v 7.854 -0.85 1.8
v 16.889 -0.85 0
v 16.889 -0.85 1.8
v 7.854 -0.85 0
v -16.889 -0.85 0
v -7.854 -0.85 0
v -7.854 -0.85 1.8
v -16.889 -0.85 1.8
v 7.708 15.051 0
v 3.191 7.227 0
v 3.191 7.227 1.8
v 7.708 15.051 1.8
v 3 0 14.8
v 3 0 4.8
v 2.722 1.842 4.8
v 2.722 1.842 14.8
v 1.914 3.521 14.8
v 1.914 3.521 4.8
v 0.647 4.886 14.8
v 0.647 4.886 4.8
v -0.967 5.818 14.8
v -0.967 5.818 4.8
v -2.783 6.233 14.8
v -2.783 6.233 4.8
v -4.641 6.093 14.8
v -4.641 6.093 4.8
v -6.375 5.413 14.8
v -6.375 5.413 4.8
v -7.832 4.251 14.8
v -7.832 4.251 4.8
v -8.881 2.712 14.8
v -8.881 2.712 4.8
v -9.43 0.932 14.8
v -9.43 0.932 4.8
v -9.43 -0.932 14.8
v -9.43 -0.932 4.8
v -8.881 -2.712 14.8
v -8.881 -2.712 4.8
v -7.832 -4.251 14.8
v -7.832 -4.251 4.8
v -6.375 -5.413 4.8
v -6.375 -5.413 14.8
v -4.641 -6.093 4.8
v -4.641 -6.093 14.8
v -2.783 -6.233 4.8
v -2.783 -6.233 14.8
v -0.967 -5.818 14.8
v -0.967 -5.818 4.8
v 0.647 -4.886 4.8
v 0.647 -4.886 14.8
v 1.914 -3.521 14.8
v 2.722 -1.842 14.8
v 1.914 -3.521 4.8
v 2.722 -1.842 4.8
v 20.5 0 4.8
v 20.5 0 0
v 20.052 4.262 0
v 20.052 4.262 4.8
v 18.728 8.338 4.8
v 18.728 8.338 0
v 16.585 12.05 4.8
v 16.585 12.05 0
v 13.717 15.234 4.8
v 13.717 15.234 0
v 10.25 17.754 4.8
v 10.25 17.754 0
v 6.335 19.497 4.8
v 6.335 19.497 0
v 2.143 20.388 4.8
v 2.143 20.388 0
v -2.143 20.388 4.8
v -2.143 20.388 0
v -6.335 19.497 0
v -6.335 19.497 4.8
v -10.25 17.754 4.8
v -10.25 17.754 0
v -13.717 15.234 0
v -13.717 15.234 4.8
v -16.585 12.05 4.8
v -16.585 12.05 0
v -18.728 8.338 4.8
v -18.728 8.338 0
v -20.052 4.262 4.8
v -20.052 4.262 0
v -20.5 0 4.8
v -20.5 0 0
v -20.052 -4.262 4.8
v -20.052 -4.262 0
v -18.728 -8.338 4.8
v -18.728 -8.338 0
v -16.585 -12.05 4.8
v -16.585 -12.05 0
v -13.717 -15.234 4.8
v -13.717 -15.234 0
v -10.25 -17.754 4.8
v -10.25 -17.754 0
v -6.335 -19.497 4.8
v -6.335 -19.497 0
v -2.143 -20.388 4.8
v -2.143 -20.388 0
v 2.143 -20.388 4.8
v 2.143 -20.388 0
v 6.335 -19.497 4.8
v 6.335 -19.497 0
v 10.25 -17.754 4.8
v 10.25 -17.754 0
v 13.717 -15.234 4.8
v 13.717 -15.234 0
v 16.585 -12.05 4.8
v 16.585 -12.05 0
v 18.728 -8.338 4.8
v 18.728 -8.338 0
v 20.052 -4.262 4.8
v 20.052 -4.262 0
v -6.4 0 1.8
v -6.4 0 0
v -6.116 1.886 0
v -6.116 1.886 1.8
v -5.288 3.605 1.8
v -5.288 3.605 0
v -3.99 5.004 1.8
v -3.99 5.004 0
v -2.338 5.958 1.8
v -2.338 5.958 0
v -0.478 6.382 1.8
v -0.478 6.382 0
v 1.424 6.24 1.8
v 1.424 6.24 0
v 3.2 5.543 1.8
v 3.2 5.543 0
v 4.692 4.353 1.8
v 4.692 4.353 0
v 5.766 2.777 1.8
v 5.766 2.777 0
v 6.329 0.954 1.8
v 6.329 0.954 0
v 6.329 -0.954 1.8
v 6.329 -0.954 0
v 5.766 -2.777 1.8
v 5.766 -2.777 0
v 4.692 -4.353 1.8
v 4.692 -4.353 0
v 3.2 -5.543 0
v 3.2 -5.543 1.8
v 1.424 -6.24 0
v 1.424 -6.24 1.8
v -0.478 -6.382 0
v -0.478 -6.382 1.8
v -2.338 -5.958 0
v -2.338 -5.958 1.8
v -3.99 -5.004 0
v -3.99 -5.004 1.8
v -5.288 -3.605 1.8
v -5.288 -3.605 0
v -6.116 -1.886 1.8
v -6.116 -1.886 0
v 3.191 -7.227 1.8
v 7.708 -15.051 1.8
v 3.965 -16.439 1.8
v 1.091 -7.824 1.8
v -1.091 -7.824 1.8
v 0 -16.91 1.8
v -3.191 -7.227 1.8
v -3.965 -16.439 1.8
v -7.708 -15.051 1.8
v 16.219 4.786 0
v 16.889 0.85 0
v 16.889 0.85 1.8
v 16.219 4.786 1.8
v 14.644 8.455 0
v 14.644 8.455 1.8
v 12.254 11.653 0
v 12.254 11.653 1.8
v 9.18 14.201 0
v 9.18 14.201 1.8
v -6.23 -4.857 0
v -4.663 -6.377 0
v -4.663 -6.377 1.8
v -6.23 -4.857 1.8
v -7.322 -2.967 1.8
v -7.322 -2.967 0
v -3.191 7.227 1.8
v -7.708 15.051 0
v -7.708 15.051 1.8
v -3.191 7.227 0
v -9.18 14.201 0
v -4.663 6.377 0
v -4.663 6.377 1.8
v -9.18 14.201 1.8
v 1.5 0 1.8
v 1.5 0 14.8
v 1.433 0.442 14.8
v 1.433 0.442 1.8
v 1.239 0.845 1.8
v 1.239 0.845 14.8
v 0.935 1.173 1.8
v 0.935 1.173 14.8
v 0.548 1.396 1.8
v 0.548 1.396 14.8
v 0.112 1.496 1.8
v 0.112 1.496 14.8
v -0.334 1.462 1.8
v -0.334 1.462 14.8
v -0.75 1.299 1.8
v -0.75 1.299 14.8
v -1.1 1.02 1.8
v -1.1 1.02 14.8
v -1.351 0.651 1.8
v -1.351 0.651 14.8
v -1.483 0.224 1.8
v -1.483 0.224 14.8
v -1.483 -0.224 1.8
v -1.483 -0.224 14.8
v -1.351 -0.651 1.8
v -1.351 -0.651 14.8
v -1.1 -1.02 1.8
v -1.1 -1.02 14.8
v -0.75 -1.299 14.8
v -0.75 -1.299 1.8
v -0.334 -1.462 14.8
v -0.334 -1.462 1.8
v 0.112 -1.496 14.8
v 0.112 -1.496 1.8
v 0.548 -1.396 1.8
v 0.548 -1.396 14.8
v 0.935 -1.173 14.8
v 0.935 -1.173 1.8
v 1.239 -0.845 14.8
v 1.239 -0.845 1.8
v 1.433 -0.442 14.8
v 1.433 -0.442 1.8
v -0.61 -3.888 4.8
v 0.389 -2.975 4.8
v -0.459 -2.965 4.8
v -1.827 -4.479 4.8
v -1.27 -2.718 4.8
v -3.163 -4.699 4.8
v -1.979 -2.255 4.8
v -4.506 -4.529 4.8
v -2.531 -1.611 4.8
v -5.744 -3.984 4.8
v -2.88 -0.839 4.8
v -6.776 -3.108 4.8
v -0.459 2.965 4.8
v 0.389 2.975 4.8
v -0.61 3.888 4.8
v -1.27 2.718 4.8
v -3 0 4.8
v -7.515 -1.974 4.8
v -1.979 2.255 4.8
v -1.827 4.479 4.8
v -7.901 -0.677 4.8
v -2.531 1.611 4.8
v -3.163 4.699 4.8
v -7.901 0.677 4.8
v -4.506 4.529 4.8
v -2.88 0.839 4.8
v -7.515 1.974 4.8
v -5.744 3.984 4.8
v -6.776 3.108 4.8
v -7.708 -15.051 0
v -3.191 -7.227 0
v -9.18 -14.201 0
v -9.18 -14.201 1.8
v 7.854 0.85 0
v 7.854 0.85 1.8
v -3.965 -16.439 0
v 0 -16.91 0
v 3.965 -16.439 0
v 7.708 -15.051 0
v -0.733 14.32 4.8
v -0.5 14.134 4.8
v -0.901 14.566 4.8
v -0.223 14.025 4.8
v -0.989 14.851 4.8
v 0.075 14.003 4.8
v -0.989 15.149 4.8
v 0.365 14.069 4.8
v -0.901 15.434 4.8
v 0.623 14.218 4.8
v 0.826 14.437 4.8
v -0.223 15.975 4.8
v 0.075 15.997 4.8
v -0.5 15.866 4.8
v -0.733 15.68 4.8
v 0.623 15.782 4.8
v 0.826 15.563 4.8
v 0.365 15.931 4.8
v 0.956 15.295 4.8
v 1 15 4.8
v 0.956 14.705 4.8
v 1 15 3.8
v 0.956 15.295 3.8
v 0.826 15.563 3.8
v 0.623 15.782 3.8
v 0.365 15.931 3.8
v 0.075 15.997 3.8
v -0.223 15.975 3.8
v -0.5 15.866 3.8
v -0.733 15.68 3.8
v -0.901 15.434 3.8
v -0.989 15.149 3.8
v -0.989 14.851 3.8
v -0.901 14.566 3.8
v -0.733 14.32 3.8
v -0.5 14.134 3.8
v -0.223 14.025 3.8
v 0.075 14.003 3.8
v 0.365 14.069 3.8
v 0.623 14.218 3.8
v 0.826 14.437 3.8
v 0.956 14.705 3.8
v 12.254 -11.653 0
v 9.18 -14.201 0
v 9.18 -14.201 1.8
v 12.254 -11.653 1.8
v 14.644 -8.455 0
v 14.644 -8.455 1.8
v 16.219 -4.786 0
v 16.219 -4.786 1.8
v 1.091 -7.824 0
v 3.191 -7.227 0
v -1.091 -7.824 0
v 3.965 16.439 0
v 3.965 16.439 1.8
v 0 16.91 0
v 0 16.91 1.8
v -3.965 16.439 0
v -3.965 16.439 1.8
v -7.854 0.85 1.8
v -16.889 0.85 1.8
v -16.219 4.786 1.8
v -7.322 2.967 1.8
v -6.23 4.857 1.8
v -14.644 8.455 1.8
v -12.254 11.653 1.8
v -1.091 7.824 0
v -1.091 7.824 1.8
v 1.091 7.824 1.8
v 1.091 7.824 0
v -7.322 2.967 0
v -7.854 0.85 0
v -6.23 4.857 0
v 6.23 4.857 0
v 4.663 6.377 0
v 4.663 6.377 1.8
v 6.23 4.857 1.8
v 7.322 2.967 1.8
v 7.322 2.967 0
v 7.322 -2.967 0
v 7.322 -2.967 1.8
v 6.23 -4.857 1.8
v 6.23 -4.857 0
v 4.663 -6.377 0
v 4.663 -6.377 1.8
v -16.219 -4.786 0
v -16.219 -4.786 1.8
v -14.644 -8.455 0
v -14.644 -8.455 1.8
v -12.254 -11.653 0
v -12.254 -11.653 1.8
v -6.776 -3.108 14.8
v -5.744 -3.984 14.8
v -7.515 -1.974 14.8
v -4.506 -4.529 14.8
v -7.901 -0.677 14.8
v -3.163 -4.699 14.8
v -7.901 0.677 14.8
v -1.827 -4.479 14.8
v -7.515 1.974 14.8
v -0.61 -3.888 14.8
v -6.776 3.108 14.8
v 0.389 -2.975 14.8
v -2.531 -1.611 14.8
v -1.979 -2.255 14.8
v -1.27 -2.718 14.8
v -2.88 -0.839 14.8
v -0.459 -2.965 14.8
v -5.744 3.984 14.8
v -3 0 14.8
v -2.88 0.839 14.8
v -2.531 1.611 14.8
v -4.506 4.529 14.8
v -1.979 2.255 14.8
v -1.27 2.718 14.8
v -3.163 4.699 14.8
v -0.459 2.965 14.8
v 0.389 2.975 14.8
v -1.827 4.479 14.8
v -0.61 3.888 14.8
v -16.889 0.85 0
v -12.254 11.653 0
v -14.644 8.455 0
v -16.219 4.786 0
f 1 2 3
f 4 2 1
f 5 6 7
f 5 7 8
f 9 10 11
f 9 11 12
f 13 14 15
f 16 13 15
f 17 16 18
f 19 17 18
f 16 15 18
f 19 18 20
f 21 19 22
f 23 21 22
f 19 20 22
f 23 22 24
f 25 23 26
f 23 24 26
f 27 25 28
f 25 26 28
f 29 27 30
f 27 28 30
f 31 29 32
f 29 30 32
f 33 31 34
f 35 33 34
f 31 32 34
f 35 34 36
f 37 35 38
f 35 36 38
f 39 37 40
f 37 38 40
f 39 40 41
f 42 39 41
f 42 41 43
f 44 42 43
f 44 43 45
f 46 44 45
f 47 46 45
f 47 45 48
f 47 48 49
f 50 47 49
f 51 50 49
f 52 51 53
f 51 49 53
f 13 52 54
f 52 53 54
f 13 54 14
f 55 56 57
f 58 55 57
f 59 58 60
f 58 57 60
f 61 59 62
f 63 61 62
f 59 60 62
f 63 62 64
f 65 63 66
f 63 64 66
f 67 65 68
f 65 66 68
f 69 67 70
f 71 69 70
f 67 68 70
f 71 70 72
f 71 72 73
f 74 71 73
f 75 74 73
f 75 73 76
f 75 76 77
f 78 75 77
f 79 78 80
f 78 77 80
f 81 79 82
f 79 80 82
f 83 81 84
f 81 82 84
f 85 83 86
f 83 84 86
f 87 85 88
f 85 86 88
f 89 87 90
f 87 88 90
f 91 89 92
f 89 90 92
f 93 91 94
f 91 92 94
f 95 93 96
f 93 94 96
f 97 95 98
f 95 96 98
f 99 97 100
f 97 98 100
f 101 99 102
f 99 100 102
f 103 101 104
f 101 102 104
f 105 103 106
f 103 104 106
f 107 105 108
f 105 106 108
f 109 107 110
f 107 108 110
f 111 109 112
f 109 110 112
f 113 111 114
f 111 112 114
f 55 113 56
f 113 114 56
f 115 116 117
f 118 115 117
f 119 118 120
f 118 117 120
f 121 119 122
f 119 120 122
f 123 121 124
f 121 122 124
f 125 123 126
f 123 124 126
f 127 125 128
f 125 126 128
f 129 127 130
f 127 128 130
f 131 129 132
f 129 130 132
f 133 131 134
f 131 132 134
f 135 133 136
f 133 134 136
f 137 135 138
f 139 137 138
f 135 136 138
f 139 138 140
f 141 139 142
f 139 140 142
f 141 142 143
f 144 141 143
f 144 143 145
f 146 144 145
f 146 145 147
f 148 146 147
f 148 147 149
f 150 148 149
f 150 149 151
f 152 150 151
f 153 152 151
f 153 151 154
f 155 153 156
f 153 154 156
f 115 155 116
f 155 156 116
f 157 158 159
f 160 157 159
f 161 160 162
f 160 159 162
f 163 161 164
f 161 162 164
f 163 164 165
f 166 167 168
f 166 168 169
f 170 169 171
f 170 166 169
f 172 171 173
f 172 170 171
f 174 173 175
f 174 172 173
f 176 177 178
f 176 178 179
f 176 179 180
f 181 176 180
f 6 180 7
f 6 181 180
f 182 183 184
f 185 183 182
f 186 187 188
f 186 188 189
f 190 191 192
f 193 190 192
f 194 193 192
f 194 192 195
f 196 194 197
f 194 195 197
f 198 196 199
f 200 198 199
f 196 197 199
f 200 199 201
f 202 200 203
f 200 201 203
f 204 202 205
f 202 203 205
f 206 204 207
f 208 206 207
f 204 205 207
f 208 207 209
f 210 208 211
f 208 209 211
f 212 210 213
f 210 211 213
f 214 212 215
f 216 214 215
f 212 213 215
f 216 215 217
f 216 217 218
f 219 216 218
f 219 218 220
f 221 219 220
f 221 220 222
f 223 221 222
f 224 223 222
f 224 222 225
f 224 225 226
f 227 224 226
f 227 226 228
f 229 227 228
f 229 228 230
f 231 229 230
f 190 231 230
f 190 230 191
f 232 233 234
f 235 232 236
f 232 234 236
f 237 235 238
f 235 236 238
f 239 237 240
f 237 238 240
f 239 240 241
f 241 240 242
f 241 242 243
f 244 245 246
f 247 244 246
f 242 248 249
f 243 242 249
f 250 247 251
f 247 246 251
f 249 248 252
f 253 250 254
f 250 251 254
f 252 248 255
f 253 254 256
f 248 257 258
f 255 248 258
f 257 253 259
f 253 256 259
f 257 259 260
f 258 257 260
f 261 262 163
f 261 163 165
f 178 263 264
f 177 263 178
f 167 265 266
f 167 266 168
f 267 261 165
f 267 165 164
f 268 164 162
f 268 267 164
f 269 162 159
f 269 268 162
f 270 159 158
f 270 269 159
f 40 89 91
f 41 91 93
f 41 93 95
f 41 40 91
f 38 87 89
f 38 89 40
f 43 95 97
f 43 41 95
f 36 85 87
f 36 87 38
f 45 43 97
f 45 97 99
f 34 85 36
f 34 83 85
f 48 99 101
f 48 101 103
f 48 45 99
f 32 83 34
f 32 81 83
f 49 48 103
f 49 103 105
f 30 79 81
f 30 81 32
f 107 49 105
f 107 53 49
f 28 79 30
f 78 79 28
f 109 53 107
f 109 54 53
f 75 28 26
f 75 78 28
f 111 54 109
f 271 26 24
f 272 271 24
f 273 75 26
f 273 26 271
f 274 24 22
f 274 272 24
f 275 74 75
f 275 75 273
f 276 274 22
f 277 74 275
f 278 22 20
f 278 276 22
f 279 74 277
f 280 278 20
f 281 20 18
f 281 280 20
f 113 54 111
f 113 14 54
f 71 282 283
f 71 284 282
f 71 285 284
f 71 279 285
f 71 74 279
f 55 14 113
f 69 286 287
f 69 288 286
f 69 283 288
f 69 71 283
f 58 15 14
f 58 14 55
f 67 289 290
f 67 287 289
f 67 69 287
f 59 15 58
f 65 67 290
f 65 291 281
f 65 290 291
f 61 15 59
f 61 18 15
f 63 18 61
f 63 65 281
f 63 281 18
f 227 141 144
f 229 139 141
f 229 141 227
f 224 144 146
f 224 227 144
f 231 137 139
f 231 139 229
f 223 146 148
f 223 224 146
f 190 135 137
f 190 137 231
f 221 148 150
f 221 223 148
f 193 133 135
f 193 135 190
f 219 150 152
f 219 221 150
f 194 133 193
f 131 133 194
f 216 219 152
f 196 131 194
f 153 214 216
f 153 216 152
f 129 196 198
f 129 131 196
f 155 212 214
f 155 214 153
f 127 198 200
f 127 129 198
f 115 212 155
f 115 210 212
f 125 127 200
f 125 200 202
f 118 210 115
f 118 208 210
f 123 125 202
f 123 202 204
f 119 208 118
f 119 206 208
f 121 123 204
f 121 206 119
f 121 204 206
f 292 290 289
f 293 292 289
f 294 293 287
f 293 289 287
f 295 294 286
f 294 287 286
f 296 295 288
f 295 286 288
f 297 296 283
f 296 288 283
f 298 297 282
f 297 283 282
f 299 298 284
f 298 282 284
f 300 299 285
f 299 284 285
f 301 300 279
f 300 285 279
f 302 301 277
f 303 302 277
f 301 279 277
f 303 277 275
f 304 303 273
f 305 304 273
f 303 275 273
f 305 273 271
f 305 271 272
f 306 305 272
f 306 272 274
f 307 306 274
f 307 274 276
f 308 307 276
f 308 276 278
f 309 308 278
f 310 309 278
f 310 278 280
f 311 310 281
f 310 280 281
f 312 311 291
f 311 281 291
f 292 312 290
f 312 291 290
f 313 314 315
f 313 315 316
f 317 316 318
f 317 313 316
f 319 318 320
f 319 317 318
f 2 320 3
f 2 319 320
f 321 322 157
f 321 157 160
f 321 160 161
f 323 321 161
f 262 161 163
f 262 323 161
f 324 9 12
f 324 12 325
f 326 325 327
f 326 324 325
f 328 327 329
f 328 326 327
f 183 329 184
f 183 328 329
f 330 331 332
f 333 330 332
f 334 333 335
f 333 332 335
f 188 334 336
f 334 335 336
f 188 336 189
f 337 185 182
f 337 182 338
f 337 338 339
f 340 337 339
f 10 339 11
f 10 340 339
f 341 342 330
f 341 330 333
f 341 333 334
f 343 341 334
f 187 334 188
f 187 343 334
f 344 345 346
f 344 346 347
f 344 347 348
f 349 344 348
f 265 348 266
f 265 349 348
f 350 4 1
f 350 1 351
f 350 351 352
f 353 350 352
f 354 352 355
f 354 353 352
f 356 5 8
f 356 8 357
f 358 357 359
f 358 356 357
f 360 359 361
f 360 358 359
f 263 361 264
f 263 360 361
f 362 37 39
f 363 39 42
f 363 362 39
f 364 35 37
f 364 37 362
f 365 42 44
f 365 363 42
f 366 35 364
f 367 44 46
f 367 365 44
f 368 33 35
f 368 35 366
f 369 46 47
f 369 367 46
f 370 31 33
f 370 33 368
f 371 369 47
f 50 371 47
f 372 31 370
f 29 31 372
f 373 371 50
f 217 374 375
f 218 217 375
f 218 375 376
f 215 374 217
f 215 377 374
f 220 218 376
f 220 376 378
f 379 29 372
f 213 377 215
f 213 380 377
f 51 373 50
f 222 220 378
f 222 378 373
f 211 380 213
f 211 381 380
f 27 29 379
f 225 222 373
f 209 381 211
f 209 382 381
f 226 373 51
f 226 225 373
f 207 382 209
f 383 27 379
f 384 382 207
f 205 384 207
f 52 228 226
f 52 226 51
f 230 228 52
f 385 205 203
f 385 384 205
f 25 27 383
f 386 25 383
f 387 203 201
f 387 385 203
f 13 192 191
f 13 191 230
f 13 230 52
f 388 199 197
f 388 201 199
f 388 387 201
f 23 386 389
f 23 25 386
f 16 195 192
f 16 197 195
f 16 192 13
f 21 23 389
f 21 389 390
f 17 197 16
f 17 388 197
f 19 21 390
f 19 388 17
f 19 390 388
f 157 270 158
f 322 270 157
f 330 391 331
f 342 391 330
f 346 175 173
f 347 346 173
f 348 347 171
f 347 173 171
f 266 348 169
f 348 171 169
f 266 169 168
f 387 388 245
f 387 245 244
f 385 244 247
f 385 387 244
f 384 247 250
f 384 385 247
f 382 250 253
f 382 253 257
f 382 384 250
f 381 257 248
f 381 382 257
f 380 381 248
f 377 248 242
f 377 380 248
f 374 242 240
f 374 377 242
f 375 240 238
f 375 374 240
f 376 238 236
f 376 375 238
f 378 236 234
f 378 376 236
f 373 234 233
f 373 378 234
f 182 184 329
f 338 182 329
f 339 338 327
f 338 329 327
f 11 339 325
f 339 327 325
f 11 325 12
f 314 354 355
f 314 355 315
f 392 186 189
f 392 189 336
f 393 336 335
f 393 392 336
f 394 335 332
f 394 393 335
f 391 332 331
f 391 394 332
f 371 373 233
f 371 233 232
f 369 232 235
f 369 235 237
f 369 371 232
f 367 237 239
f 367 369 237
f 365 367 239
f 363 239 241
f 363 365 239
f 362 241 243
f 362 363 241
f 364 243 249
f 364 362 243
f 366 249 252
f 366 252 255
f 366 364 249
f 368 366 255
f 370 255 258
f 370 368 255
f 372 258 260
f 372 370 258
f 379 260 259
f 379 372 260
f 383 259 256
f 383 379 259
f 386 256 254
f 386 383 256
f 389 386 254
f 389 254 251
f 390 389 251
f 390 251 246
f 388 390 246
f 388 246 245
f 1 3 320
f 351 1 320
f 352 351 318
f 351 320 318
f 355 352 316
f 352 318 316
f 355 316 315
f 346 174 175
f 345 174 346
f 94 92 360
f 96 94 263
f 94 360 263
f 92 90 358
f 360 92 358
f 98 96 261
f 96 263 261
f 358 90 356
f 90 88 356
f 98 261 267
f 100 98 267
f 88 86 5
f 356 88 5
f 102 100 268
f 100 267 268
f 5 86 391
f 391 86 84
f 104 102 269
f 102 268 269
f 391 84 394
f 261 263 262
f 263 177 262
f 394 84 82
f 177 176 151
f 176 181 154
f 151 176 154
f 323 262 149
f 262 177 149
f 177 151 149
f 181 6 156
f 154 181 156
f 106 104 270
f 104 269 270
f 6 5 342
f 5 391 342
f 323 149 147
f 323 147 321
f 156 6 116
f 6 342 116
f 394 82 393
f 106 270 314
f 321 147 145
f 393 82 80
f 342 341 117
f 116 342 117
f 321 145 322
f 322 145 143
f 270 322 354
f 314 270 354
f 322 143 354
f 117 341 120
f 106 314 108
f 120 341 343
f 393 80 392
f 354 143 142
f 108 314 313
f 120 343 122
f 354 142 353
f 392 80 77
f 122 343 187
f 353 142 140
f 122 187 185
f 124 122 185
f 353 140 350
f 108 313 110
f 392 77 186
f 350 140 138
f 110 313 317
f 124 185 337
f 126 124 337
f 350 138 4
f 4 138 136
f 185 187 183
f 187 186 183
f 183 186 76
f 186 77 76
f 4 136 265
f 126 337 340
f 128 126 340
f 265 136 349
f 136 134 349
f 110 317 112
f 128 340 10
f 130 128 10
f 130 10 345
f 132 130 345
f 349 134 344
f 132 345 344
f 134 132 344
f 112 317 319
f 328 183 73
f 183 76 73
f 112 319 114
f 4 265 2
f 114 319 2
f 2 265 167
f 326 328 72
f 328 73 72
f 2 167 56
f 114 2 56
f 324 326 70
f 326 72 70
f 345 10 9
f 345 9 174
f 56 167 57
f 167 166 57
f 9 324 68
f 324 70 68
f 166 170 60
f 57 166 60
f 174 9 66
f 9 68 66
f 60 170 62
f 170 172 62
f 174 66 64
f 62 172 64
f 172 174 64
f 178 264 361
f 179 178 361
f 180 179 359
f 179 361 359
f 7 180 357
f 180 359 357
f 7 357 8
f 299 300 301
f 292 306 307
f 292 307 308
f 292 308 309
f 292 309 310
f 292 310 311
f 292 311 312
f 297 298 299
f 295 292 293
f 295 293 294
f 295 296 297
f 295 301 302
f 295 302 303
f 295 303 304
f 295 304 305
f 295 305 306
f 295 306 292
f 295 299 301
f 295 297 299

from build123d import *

# Parameters (mm, degrees)
ESQUISSE2_R                  = 20.5
EXTRUSION1_DEPTH             = 4.8
ESQUISSE3_R                  = 6.25
EXTRUSION2_DEPTH             = 10
ENL_V_MAT_EXTRU_1_DEPTH      = 10
ESQUISSE5_R                  = 1.5
ENL_V_MAT_EXTRU_2_DEPTH      = 33.550576032
ESQUISSE6_R                  = 6.4
ENL_V_MAT_EXTRU_3_DEPTH      = 1.8
ESQUISSE7_R                  = 1
ENL_V_MAT_EXTRU_4_DEPTH      = 1
ENL_V_MAT_EXTRU_5_DEPTH      = 1.8
R_P_TITION_CIRCULAIRE1_COUNT = 6


with BuildPart() as part:
    # Esquisse2 → Extrusion1 (new body)
    with BuildSketch(Plane.XY):
        Circle(ESQUISSE2_R)
    extrude(amount=EXTRUSION1_DEPTH)

    # Esquisse3 → Extrusion2 (add)
    with BuildSketch(Plane.XY.offset(4.8)):
        with Locations((-3.25, 0)):
            Circle(ESQUISSE3_R)
    extrude(amount=EXTRUSION2_DEPTH)

    # Esquisse4 → Enlèv. mat.-Extru.1 (cut)
    with BuildSketch(Plane.XY.offset(14.8)):
        with BuildLine():
            ThreePointArc((0.388846154, 2.974693038), (-3, 0), (0.388846154, -2.974693038))
            ThreePointArc((0.388846154, -2.974693038), (-7.95, 0), (0.388846154, 2.974693038))
        make_face()
    extrude(amount=-ENL_V_MAT_EXTRU_1_DEPTH, mode=Mode.SUBTRACT)

    # Esquisse5 → Enlèv. mat.-Extru.2 (cut, through all)
    with BuildSketch(Plane.XY.offset(14.8)):
        Circle(ESQUISSE5_R)
    extrude(amount=-ENL_V_MAT_EXTRU_2_DEPTH, mode=Mode.SUBTRACT)

    # Esquisse6 → Enlèv. mat.-Extru.3 (cut)
    with BuildSketch(Plane(origin=(0, 0, 0), x_dir=(-1, 0, 0), z_dir=(0, 0, -1))):
        Circle(ESQUISSE6_R)
    extrude(amount=-ENL_V_MAT_EXTRU_3_DEPTH, mode=Mode.SUBTRACT)

    # Esquisse7 → Enlèv. mat.-Extru.4 (cut)
    with BuildSketch(Plane.XY.offset(4.8)):
        with Locations((0, 15)):
            Circle(ESQUISSE7_R)
    extrude(amount=-ENL_V_MAT_EXTRU_4_DEPTH, mode=Mode.SUBTRACT)

    # Esquisse8 → Enlèv. mat.-Extru.5 (cut)
    with BuildSketch(Plane(origin=(0, 0, 0), x_dir=(-1, 0, 0), z_dir=(0, 0, -1))):
        with BuildLine():
            Line((-3.190947925, 7.22688393), (-7.708190102, 15.05097689))
            ThreePointArc((-7.708190102, 15.05097689), (0, 16.91), (7.708190102, 15.05097689))
            Line((7.708190102, 15.05097689), (3.190947925, 7.22688393))
            ThreePointArc((3.190947925, 7.22688393), (0, 7.9), (-3.190947925, 7.22688393))
        make_face()
    enl_v_mat_extru_5 = extrude(amount=-ENL_V_MAT_EXTRU_5_DEPTH, mode=Mode.SUBTRACT)

    # Répétition circulaire1: Enlèv. mat.-Extru.5 ×6 about axis
    r_p_tition_circulaire1_axis = Axis((0, 0, 21.473863608), (0, 0, -1))
    for i in range(1, R_P_TITION_CIRCULAIRE1_COUNT):
        add(enl_v_mat_extru_5.rotate(r_p_tition_circulaire1_axis, i * 360 / R_P_TITION_CIRCULAIRE1_COUNT), mode=Mode.SUBTRACT)


solid = part.part
